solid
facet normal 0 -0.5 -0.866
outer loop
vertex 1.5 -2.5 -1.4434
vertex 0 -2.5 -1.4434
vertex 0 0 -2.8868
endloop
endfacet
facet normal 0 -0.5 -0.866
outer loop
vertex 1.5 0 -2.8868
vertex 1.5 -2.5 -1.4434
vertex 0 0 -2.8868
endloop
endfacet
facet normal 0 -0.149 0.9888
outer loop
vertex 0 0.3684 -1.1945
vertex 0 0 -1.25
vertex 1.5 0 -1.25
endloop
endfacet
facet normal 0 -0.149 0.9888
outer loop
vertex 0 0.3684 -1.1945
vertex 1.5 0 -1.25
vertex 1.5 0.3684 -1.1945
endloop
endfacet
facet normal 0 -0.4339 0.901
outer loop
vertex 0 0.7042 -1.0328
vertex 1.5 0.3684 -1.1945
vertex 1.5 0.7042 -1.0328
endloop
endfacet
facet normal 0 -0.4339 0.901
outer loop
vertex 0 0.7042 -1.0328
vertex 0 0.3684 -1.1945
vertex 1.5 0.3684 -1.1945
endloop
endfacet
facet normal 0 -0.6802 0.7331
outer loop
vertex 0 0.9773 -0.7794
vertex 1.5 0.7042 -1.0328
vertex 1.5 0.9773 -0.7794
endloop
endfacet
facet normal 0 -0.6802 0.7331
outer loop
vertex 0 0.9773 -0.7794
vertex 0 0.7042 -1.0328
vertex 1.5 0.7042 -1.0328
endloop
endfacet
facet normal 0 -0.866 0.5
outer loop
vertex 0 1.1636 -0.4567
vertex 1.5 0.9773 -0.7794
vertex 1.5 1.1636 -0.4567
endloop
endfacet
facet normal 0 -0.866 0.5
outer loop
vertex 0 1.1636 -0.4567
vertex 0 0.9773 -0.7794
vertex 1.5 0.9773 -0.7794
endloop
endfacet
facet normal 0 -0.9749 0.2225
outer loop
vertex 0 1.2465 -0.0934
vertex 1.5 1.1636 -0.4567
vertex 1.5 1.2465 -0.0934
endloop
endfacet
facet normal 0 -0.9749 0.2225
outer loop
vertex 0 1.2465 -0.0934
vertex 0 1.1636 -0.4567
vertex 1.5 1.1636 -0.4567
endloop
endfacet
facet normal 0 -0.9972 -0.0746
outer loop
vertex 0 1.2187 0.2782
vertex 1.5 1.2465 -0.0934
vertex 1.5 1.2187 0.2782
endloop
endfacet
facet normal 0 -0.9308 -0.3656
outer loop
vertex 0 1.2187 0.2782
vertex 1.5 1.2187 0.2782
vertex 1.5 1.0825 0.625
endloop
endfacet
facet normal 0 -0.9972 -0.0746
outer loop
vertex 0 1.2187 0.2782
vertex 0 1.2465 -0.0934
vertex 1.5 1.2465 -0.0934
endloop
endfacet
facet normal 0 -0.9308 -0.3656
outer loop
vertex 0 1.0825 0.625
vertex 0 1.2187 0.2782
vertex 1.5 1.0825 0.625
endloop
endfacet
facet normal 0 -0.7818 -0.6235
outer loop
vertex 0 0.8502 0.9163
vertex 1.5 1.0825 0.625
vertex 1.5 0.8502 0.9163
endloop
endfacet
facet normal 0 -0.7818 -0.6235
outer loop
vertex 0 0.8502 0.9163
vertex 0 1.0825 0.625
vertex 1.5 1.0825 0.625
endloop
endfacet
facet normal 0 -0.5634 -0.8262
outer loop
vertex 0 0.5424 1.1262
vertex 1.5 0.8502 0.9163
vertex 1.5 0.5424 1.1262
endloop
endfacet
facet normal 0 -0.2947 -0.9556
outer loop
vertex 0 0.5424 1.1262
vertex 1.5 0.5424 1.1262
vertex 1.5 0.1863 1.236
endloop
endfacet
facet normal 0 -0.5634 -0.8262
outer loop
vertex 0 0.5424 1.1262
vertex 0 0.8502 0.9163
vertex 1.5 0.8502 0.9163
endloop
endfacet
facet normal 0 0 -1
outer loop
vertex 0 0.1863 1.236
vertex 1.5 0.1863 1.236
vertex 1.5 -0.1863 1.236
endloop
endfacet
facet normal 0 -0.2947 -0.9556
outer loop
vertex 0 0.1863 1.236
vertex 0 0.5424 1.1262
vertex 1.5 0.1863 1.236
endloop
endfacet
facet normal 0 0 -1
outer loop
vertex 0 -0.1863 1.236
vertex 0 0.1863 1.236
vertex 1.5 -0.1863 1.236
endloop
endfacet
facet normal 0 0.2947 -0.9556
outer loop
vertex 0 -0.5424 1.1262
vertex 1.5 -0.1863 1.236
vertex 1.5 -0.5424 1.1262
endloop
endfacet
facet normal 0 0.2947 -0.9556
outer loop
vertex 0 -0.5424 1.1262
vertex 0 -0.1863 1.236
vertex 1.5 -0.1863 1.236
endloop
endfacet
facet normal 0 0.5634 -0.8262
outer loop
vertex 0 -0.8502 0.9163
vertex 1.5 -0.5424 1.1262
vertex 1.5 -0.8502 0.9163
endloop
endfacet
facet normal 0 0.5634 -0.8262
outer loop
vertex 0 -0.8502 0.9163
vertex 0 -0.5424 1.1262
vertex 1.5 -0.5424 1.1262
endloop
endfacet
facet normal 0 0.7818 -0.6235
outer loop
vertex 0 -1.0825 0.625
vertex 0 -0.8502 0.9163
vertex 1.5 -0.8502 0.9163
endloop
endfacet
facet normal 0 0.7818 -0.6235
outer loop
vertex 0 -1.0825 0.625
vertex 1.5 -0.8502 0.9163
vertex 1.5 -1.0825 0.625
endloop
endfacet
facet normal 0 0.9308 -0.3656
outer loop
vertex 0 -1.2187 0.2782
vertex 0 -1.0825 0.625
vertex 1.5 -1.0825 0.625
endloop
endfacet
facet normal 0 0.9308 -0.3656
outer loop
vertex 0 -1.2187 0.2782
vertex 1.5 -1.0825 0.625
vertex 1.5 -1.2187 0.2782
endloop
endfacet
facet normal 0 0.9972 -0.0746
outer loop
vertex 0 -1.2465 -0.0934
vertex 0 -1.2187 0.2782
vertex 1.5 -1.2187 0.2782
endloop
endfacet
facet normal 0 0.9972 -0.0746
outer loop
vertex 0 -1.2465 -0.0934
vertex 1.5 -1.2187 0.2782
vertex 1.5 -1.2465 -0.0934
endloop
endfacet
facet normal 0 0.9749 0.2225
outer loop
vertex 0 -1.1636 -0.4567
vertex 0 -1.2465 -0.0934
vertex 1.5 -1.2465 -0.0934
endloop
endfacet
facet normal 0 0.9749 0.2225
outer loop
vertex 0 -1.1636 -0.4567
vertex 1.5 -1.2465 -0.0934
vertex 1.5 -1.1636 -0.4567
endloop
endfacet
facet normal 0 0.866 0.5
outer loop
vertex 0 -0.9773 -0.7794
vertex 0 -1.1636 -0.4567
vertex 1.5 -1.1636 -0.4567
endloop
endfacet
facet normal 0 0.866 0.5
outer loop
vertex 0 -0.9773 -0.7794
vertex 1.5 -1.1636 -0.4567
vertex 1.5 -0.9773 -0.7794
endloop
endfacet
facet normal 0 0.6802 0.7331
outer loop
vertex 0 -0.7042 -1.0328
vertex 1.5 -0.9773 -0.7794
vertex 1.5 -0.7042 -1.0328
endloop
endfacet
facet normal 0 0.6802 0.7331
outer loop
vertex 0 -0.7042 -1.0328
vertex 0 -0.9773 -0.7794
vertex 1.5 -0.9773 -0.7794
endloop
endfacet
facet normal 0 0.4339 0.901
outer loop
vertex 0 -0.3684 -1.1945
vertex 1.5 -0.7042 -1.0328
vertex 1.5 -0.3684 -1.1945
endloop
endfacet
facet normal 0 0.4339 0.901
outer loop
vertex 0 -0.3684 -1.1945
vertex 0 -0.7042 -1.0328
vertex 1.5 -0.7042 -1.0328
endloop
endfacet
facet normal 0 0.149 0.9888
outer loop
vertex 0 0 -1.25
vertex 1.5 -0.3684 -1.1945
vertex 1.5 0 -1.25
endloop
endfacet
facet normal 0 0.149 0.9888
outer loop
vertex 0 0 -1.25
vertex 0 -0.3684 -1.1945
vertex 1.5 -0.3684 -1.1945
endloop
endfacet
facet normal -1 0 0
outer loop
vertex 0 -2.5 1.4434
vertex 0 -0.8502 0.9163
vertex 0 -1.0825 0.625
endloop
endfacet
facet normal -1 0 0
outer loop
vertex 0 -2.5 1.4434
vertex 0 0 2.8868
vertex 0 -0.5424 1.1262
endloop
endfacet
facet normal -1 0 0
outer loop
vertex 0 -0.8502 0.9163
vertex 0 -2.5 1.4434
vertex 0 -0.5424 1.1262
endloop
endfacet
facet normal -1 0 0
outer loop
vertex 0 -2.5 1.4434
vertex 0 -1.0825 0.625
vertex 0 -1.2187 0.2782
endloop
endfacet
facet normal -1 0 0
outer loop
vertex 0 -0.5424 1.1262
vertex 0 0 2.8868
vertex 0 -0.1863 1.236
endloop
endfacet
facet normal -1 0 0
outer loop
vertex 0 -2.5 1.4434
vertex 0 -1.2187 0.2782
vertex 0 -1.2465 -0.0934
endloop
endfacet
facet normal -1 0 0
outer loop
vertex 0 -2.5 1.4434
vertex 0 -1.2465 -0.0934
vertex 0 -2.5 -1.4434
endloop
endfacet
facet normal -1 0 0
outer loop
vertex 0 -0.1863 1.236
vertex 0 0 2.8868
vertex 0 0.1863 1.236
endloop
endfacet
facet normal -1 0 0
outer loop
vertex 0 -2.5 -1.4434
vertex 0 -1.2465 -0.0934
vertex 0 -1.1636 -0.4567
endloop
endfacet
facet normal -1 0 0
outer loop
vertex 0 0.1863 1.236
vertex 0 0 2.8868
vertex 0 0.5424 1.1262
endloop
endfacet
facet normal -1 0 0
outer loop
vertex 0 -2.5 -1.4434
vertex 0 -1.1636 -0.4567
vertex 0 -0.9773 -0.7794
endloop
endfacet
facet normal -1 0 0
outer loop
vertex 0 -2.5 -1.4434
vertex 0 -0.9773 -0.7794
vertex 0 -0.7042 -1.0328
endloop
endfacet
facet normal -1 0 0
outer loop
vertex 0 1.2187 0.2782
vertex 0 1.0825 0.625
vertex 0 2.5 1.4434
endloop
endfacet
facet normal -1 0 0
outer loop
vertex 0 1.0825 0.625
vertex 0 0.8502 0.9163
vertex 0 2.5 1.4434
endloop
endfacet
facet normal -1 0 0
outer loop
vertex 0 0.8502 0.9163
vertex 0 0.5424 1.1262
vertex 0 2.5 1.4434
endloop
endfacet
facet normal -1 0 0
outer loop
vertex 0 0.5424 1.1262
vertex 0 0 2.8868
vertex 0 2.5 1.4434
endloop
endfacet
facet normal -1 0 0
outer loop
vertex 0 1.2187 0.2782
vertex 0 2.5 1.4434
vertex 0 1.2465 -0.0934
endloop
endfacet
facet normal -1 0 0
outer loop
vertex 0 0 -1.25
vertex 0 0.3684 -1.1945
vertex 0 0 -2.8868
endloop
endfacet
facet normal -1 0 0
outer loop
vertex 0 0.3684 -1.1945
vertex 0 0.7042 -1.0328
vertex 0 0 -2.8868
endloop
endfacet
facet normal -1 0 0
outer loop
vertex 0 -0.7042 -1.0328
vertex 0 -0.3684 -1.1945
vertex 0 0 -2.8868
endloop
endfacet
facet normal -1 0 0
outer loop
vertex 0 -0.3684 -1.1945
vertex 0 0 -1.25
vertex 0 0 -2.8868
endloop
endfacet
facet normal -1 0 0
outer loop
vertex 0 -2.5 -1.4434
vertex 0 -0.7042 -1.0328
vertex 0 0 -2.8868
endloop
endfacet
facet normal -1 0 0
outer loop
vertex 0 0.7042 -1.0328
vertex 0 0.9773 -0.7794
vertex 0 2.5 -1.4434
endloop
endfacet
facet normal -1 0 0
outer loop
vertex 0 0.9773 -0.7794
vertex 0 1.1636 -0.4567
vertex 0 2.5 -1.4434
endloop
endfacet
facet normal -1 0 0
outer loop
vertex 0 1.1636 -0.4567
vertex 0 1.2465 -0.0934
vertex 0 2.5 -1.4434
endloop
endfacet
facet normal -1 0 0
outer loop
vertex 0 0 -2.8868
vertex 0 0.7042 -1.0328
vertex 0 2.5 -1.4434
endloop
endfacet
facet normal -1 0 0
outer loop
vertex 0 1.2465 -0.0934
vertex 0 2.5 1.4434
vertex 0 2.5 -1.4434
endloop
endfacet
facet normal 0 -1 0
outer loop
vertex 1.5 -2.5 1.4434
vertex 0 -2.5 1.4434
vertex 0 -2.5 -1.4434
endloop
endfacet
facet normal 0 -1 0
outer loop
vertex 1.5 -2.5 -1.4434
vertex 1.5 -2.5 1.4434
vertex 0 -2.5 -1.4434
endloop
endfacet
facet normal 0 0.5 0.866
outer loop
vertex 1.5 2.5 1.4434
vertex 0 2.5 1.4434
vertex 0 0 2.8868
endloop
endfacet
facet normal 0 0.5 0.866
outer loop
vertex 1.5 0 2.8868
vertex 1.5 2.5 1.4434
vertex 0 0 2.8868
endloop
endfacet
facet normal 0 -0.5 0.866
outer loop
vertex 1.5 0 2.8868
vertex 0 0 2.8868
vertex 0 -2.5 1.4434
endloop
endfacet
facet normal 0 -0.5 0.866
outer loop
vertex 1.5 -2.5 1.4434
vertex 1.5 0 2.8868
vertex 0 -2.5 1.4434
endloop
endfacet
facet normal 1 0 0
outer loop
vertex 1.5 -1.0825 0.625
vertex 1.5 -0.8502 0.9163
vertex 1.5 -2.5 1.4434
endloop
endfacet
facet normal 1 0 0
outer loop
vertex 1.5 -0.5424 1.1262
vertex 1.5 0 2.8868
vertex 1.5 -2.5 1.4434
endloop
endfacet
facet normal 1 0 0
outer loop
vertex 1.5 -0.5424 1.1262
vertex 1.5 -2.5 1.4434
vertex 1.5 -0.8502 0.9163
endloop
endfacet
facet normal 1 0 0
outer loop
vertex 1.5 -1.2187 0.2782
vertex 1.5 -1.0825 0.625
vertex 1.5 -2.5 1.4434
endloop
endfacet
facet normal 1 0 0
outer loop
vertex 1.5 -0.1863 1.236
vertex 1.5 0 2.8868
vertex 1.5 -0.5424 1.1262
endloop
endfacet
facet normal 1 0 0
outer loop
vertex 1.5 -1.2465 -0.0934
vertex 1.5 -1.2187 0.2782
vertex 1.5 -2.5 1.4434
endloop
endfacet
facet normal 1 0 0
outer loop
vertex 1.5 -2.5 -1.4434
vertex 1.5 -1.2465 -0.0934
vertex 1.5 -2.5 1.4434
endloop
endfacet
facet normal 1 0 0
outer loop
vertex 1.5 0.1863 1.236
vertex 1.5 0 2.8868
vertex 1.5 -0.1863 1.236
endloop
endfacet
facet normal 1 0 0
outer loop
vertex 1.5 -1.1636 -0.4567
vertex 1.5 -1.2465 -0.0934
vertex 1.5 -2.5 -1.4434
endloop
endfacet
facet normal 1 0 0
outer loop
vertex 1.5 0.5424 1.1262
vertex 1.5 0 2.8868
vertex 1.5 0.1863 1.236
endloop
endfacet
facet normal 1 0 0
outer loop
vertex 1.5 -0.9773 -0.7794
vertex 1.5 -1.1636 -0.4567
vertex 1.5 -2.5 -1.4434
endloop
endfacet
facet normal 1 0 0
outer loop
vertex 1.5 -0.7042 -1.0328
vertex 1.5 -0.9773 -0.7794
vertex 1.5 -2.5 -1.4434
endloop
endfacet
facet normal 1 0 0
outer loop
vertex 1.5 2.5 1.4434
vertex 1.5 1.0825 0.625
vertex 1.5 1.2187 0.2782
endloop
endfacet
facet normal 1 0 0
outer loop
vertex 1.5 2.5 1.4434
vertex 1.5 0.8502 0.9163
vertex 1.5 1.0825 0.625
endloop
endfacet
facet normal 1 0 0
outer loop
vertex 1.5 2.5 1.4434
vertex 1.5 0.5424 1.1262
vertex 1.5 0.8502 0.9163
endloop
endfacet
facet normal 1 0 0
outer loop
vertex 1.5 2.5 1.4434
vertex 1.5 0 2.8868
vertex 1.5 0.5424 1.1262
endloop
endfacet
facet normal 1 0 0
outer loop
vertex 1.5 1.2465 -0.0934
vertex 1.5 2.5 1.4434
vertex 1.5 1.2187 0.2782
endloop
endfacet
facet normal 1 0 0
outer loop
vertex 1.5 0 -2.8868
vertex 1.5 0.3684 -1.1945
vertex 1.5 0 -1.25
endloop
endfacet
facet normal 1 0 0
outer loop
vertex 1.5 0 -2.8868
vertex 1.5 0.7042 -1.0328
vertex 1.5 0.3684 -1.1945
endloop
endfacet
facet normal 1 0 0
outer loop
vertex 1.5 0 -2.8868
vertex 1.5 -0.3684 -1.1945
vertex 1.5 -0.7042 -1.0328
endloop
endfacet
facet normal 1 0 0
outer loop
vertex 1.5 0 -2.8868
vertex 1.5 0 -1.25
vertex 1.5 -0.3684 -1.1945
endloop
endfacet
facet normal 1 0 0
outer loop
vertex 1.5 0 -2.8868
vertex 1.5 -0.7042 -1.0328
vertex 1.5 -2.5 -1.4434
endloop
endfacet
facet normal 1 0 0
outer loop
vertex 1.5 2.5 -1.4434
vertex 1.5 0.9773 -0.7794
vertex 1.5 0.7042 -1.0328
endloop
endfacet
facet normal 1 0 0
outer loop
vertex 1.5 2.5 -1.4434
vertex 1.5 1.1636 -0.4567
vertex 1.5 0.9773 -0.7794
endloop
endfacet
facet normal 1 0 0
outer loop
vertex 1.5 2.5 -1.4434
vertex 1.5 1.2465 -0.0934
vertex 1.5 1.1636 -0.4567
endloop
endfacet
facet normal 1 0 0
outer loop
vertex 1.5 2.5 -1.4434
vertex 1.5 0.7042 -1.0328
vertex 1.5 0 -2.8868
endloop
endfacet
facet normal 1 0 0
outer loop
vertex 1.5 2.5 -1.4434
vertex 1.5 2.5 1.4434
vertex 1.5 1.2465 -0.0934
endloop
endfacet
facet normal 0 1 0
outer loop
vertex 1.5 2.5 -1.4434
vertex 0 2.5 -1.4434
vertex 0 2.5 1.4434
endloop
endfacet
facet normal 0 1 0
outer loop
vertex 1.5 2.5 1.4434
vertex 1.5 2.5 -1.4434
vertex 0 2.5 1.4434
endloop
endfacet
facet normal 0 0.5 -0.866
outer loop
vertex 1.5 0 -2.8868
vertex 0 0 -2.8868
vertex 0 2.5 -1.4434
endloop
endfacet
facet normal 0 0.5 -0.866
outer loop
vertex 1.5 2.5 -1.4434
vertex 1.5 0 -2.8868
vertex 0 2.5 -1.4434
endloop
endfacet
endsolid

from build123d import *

# Parameters (mm, degrees)
SKETCH1_R           = 2.5
BOSS_EXTRUDE1_DEPTH = 3
SCALE1_SCALE        = 0.5


with BuildPart() as part:
    # Sketch1 → Boss-Extrude1 (new body)
    with BuildSketch(Plane(origin=(0, 0, 0), x_dir=(0, 0, -1), z_dir=(1, 0, 0))):
        Polygon((5.773502692, 0), (2.886751346, 5), (-2.886751346, 5), (-5.773502692, 0), (-2.886751346, -5), (2.886751346, -5), align=None)
        Circle(SKETCH1_R, mode=Mode.SUBTRACT)
    extrude(amount=BOSS_EXTRUDE1_DEPTH)


with BuildPart() as part_1:
    # Scale1: scaled about (0, 0, 0)
    add(part.part.scale(SCALE1_SCALE))


solid = part_1.part
